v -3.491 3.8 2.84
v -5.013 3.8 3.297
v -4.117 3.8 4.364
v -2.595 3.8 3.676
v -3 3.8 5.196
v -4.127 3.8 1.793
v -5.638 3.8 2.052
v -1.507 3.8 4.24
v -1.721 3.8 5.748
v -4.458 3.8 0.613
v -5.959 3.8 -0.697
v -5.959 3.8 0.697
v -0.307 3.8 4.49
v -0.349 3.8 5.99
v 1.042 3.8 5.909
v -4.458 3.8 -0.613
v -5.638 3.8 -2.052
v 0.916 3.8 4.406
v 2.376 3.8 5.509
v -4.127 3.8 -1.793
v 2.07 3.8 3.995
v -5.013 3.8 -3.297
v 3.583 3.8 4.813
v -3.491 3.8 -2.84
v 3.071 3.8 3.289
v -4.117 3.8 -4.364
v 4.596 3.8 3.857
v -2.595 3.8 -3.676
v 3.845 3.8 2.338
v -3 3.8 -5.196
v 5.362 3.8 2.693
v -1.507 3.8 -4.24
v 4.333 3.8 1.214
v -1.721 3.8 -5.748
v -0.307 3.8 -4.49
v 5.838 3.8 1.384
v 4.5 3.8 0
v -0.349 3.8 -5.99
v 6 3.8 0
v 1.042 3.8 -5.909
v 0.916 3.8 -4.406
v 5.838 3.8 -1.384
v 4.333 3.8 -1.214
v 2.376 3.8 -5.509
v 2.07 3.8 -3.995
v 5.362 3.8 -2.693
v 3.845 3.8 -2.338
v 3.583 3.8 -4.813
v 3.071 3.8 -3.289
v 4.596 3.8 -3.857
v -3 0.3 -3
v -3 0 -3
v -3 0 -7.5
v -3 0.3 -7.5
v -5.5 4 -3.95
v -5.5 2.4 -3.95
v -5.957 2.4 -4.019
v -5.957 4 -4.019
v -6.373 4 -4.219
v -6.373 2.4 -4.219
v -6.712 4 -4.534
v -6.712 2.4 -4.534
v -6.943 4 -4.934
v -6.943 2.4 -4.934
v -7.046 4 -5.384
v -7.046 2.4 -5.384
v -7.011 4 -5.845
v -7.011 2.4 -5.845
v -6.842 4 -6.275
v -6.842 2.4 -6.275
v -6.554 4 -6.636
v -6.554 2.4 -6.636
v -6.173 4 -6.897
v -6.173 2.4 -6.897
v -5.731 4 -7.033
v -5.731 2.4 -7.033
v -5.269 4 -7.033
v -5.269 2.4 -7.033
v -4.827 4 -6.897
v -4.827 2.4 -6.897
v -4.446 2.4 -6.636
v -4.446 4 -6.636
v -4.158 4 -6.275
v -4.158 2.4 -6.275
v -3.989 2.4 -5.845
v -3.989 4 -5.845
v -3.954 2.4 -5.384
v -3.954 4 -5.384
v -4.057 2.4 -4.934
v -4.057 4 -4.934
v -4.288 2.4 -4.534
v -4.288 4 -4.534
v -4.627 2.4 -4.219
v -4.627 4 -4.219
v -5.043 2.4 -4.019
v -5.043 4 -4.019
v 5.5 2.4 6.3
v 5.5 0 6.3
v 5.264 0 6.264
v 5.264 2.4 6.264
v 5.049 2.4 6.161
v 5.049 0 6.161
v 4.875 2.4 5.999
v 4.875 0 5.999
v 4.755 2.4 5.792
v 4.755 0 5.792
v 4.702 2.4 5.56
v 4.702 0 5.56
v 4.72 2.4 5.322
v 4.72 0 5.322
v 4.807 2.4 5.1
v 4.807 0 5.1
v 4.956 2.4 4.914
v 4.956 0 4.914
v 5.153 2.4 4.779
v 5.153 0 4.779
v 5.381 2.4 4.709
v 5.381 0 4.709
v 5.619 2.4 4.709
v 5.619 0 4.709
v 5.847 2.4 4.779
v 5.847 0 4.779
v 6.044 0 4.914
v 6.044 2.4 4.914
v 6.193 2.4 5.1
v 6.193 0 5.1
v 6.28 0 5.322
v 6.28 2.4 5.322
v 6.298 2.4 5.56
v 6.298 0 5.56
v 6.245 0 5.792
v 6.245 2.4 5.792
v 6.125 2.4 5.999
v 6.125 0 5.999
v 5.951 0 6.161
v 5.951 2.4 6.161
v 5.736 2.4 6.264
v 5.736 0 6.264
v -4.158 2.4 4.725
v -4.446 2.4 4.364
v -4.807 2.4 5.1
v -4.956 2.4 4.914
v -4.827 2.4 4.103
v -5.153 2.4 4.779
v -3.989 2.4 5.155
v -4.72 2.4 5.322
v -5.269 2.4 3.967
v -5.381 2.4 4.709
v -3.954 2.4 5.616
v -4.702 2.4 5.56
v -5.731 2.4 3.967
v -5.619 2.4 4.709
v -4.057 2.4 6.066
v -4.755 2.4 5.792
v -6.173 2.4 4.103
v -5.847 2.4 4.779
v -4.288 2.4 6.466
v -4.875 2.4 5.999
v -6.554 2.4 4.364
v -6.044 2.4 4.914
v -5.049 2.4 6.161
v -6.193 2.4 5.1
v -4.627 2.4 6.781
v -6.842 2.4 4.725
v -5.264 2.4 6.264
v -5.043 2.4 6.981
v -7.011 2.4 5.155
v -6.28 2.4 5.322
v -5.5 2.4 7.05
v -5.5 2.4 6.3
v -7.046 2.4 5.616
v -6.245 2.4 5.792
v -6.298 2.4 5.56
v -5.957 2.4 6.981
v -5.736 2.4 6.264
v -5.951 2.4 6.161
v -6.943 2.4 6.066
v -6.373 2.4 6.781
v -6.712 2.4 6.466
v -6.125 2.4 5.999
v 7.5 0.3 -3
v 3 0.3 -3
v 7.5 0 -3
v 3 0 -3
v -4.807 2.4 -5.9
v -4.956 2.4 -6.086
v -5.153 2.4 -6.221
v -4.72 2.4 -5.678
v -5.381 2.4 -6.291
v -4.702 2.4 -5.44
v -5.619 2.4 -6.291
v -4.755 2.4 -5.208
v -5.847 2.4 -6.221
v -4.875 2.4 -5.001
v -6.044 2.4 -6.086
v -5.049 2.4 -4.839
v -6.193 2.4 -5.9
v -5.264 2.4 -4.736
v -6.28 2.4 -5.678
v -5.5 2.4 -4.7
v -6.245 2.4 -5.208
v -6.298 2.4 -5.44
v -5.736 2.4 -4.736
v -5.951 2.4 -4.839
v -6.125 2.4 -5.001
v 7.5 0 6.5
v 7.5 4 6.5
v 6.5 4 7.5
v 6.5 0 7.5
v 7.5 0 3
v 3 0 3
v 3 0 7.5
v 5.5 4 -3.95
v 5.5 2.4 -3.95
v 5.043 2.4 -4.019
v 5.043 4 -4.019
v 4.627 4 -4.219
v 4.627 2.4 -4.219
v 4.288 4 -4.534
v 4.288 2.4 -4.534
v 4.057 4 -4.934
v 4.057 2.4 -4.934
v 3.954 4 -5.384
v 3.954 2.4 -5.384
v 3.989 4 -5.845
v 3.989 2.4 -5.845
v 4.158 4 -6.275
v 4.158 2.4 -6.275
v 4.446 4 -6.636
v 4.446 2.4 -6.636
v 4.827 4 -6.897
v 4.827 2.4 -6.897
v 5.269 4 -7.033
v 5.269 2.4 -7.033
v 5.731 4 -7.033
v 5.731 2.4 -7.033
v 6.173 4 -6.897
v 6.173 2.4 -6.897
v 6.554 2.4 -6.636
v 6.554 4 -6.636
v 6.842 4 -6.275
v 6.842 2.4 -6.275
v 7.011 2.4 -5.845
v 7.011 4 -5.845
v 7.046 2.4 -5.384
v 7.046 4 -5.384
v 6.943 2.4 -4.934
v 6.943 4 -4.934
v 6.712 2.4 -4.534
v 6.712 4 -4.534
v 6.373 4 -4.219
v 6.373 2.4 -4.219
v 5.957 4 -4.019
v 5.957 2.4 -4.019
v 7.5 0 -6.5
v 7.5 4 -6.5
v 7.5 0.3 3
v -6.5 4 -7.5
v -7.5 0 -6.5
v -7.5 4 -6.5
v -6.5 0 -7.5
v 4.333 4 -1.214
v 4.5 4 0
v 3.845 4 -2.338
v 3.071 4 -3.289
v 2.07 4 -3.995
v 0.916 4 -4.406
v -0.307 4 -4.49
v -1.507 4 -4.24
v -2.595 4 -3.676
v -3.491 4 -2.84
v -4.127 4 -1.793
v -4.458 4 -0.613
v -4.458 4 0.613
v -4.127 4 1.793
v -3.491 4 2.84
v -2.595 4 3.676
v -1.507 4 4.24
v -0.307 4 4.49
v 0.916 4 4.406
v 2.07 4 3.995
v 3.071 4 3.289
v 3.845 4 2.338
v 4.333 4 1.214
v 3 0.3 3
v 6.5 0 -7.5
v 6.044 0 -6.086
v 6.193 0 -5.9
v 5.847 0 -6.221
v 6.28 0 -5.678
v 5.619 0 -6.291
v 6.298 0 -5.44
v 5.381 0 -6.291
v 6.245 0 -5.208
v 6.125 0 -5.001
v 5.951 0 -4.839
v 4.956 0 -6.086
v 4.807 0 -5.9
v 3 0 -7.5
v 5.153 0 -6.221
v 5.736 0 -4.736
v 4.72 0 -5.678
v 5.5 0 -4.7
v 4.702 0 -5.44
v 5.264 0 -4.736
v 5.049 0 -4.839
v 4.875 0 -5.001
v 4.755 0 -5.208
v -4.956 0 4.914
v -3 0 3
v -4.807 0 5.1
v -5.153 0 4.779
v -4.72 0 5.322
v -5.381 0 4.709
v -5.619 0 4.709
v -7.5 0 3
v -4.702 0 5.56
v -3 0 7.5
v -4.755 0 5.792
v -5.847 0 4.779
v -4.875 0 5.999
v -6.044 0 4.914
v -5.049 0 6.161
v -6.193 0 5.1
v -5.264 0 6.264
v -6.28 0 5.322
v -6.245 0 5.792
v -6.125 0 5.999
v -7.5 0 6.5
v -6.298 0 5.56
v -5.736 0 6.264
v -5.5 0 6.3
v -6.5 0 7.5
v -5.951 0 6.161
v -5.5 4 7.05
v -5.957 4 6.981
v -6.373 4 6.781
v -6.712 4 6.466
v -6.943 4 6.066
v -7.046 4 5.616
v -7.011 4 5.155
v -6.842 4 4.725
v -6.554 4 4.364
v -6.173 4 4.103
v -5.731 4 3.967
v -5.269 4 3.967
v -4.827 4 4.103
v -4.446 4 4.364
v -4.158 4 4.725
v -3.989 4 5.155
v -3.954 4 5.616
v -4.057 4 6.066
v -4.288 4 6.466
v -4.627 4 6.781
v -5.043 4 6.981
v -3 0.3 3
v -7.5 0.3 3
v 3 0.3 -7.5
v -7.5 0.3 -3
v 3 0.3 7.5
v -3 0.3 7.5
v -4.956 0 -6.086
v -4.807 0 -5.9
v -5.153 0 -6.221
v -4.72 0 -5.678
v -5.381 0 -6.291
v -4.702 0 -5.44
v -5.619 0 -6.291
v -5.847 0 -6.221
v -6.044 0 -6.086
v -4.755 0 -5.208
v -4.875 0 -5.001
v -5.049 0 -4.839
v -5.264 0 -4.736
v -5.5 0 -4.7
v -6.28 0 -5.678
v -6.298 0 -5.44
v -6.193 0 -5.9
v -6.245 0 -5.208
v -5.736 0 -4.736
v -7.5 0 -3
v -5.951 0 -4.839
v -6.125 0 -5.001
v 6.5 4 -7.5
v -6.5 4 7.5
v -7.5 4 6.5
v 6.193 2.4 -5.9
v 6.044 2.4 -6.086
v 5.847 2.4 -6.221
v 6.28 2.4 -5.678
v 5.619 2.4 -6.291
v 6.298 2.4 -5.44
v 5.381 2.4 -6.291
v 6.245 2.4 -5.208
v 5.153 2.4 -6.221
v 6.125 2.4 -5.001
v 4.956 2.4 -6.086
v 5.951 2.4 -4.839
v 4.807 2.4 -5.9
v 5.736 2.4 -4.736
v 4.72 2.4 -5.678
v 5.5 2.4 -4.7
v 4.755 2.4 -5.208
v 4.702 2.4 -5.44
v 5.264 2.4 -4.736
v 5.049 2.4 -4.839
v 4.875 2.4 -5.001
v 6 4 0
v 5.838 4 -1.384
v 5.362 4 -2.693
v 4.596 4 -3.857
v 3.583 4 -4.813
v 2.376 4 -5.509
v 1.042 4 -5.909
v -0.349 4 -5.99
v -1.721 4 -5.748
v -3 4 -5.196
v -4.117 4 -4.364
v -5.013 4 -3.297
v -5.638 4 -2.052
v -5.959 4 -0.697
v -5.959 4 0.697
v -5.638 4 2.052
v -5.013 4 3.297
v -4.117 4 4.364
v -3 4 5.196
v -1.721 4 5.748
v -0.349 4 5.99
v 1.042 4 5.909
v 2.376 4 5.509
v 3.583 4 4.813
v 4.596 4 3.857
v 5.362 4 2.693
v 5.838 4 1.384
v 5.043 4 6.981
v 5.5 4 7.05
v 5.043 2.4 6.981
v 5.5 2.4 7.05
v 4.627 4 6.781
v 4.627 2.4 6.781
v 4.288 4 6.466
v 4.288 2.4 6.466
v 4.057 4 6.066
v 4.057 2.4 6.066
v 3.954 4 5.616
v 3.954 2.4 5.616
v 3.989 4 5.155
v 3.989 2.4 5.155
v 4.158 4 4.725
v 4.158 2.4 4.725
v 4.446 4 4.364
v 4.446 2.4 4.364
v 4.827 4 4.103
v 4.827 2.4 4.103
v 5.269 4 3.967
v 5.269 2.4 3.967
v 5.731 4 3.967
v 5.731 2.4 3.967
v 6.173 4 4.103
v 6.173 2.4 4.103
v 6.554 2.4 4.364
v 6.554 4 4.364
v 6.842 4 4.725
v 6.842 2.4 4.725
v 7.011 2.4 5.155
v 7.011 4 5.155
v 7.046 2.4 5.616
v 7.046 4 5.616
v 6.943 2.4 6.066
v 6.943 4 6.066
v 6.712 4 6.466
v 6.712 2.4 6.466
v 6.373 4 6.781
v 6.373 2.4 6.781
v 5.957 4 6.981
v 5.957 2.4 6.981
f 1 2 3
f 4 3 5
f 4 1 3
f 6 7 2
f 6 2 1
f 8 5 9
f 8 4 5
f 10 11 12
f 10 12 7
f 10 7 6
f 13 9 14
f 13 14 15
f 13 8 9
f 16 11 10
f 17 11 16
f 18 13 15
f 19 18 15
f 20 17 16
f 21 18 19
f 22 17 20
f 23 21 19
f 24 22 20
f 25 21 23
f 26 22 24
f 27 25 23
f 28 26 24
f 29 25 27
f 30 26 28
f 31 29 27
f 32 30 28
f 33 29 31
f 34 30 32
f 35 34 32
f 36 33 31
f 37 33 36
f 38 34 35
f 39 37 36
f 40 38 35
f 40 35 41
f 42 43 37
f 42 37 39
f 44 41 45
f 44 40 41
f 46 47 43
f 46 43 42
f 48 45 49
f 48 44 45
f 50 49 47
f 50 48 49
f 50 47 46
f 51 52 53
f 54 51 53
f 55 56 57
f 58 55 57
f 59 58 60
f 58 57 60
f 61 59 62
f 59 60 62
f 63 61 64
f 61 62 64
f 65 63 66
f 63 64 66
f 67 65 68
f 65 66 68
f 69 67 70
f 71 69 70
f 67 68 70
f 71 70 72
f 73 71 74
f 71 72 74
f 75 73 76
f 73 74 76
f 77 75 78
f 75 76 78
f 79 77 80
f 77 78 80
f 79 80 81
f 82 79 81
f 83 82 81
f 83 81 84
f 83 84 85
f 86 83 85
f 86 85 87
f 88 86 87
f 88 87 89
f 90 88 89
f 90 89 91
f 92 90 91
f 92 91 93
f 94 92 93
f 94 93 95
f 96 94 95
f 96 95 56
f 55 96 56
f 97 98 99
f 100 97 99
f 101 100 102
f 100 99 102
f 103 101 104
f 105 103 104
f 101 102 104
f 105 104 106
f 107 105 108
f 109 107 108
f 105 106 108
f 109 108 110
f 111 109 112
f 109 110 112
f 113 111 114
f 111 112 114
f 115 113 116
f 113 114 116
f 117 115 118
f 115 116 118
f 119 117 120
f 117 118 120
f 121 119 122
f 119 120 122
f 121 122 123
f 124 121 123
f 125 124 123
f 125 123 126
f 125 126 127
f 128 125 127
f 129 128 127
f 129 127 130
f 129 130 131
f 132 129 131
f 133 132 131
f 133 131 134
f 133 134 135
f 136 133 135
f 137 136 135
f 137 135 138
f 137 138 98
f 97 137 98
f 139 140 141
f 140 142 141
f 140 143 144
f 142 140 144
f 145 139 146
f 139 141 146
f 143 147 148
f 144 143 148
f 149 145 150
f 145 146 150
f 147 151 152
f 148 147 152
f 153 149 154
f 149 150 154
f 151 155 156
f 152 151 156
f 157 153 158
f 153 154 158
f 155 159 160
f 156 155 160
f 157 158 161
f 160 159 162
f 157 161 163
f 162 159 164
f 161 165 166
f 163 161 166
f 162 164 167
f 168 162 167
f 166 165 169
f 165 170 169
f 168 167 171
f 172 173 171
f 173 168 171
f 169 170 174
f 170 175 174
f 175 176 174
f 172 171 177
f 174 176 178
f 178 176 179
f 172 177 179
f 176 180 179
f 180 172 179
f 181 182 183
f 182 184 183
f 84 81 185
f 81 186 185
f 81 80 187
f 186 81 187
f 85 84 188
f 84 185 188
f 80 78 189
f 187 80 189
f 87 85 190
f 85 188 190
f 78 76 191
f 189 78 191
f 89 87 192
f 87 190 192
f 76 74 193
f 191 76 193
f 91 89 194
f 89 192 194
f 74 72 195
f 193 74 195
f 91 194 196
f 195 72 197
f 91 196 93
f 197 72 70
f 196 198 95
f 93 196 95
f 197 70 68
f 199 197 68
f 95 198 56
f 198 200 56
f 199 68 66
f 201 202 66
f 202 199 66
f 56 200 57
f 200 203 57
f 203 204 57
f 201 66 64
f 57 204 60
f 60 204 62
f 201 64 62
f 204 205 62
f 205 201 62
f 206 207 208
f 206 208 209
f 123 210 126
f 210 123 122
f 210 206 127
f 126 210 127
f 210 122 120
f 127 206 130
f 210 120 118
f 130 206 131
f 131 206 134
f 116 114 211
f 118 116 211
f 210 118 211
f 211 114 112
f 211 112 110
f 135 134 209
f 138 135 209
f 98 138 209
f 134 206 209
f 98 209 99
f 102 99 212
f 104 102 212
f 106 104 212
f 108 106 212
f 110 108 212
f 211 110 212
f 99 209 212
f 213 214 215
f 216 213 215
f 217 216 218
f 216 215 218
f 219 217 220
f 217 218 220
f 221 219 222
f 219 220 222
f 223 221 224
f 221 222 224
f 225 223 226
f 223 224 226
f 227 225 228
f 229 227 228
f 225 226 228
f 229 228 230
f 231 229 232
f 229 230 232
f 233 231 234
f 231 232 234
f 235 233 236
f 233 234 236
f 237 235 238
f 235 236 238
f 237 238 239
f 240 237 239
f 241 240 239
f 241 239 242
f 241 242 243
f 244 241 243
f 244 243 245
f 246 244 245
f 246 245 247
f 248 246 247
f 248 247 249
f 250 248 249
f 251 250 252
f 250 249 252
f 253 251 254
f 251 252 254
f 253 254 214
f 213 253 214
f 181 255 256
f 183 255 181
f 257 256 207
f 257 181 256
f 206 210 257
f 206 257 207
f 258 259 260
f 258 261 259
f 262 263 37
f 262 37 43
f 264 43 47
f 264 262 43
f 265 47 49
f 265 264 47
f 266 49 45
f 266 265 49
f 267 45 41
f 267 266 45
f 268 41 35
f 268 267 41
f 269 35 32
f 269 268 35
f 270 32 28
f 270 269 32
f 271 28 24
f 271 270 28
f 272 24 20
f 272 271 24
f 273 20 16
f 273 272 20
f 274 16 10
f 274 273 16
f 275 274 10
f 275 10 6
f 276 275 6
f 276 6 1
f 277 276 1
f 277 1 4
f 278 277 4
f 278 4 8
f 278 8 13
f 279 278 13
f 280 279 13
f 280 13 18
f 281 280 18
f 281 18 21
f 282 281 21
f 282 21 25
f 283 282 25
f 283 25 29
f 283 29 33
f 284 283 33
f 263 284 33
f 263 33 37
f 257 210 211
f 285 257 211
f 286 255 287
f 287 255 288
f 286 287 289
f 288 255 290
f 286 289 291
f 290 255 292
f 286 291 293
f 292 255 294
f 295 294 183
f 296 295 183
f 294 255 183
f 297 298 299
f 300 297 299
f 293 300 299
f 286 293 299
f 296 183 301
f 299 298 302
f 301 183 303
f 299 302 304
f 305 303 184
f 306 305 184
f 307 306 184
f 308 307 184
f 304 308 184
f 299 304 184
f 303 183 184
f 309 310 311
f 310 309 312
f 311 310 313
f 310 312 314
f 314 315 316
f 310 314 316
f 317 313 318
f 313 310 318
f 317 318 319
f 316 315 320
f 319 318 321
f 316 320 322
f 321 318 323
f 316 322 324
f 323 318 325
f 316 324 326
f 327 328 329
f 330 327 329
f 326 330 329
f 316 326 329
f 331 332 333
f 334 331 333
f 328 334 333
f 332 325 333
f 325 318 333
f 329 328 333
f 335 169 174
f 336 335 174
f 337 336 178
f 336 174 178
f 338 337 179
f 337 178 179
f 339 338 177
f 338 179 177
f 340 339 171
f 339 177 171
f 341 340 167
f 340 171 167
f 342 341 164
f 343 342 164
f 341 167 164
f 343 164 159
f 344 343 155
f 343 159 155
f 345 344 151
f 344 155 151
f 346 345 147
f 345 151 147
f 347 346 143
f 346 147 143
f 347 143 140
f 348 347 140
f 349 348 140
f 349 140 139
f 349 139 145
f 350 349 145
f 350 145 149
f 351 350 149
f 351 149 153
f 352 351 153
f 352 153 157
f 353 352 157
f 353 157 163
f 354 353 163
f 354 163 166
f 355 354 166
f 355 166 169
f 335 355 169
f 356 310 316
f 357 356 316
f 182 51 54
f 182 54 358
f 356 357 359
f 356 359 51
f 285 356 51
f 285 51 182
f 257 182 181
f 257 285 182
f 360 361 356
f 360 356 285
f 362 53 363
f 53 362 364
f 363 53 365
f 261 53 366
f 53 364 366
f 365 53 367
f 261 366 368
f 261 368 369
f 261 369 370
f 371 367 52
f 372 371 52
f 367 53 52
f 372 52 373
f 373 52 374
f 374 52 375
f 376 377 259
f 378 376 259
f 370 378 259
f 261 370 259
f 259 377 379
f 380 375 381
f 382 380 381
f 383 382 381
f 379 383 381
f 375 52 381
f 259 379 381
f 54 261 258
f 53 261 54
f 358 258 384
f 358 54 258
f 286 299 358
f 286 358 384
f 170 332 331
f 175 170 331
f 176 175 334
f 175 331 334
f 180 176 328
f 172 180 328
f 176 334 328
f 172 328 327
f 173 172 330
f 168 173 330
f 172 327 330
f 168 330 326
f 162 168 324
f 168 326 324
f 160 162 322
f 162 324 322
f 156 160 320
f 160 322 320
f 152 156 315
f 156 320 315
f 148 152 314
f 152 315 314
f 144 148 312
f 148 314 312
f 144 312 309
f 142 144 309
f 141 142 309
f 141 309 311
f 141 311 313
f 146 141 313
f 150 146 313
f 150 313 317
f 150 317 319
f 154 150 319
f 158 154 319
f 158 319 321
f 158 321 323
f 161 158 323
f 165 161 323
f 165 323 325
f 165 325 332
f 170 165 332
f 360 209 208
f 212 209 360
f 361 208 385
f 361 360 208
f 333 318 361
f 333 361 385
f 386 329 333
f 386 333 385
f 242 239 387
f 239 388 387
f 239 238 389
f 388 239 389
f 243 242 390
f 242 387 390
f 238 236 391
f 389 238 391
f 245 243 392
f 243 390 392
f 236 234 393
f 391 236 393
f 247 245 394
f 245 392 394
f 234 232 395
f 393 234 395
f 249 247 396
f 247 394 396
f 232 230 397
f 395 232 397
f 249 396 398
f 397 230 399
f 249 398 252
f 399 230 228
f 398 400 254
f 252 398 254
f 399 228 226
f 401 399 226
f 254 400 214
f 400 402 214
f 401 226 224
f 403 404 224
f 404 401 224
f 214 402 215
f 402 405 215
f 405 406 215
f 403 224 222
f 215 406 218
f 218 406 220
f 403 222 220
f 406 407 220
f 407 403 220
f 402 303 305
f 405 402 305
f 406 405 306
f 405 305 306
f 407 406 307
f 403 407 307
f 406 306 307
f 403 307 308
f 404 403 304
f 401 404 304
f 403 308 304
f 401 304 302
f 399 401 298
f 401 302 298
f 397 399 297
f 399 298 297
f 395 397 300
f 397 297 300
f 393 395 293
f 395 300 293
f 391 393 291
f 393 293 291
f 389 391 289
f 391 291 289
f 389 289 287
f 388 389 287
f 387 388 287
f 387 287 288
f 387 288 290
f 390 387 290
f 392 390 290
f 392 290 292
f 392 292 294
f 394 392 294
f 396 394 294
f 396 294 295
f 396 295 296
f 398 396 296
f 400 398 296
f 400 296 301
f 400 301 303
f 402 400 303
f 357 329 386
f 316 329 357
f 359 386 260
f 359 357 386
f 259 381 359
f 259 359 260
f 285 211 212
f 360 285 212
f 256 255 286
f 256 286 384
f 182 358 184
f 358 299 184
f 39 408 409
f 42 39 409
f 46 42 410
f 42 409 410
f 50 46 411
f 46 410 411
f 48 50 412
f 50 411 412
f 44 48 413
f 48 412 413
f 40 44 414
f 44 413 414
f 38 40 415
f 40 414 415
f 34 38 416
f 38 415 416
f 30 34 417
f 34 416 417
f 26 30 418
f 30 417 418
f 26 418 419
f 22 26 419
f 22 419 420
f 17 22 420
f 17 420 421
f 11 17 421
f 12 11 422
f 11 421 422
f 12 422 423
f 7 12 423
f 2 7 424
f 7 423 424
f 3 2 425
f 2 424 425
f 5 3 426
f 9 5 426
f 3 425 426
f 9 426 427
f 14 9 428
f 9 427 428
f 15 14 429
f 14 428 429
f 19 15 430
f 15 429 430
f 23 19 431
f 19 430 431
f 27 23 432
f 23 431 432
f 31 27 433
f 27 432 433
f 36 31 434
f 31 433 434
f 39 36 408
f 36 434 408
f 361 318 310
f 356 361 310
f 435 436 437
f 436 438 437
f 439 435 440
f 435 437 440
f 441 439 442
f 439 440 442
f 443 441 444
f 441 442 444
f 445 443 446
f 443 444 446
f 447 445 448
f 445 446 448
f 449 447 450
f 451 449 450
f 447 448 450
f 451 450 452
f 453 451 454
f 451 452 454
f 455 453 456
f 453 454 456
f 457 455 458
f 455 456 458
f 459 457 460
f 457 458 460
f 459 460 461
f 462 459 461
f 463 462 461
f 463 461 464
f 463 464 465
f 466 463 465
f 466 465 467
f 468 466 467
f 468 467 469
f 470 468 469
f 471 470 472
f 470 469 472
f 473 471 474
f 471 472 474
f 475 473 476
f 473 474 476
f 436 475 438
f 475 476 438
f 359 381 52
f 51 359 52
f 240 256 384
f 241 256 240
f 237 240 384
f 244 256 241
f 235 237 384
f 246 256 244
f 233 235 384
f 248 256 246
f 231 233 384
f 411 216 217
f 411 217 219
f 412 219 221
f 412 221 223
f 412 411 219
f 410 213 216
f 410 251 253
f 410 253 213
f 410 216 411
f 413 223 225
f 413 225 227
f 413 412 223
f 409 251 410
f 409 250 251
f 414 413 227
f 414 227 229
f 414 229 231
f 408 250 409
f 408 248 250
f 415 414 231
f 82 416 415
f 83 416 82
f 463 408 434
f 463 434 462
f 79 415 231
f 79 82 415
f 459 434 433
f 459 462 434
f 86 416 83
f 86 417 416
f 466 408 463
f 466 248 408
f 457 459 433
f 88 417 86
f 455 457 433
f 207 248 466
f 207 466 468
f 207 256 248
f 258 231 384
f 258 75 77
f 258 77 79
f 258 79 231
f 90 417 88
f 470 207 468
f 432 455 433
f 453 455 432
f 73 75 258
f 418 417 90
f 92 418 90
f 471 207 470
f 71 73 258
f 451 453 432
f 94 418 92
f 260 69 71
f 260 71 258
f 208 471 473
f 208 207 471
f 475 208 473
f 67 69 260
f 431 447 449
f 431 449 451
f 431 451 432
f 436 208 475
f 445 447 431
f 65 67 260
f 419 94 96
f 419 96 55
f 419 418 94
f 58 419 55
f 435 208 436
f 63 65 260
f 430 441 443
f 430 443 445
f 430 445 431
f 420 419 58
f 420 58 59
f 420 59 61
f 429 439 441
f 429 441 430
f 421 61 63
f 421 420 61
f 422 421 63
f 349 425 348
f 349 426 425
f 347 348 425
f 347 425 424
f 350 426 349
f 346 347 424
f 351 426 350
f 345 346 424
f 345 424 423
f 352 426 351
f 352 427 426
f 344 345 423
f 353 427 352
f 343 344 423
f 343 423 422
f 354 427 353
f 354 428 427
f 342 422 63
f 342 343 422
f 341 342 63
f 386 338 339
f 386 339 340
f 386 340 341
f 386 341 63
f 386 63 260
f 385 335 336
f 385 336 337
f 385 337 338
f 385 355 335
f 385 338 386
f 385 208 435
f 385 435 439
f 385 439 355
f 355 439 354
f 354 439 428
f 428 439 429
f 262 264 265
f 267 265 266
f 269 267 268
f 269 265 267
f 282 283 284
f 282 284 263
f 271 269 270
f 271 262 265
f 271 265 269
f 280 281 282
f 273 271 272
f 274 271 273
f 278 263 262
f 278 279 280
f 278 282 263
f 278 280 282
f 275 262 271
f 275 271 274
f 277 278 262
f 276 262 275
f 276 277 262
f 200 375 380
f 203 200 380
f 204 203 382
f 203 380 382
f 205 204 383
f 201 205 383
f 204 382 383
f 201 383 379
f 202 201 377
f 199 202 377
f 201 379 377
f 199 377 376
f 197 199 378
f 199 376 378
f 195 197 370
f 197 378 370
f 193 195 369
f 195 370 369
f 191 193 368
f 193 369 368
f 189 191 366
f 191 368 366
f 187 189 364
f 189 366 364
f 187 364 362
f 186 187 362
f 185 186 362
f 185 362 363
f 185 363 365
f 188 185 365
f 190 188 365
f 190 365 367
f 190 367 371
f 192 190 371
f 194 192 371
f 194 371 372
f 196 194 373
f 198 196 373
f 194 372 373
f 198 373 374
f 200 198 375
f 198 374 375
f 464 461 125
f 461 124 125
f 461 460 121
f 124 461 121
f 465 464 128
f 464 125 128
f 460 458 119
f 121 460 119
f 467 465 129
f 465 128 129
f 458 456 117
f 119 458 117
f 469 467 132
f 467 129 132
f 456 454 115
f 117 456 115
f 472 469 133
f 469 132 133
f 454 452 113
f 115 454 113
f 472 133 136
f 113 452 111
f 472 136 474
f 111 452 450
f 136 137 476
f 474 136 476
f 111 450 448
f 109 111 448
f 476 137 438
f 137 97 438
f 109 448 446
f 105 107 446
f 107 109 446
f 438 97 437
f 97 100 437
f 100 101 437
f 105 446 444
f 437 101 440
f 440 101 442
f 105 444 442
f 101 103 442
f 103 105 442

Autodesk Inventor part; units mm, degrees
ref_plane "YZ Plane" through (0, 0, 0) normal (1, 0, 0) x (0, 1, 0)
ref_plane "XZ Plane" through (0, 0, 0) normal (0, 1, 0) x (-1, 0, 0)
ref_plane "XY Plane" through (0, 0, 0) normal (0, 0, 1) x (1, 0, 0)
sketch "Sketch1" plane through (0, 0, 0) normal (0, 1, 0) x (-1, 0, 0)
  line L0 (-7.5, 7.5) -> (7.5, 7.5)
  line L1 (7.5, 7.5) -> (7.5, -7.5)
  line L2 (7.5, -7.5) -> (-7.5, -7.5)
  line L3 (-7.5, -7.5) -> (-7.5, 7.5)
  line L4 (-7.5, 7.5) -> (7.5, -7.5) construction
  line L5 (7.5, 7.5) -> (-7.5, -7.5) construction
  point P0 (0, 0)
  dimension "d0" = 15
  dimension "d1" = 15
extrude "Extrusion1" add sketch "Sketch1" along normal blind 4
sketch "Sketch2" plane through (0, 4, 0) normal (0, 1, 0) x (1, 0, 0)
  line L0 (5.5, -5.5) -> (-5.5, -5.5) construction
  line L1 (-5.5, -5.5) -> (-5.5, 5.5) construction
  line L2 (-5.5, 5.5) -> (5.5, 5.5) construction
  line L3 (5.5, 5.5) -> (5.5, -5.5) construction
  line L4 (5.5, -5.5) -> (-5.5, 5.5) construction
  line L5 (-5.5, -5.5) -> (5.5, 5.5) construction
  point P0 (0, 0)
  dimension "d4" = 11
  dimension "d5" = 11
chamfer "Chamfer1" distance 1 angle 45 4 edges at (-7.5, 2, 7.5) (7.5, 2, 7.5) (7.5, 2, -7.5) (-7.5, 2, -7.5)
hole "Hole1" at (-5.5, 4, -5.5) at (5.5, 4, -5.5) at (5.5, 4, 5.5) at (-5.5, 4, 5.5) direction (0, -1, 0) diameter 1.6 end through all counterbore diameter 3.1 counterbore depth 1.6 clearance for "Socket Head Cap Screw ISO 4762" size "M1.4" standard "ISO"
sketch "Sketch3" plane through (0, 4, 0) normal (0, 1, 0) x (1, 0, 0)
  circle A0 centre (0, 0) radius 6
  circle A1 centre (0, 0) radius 4.5
  dimension "d16" = 12
  dimension "d17" = 9
extrude "Extrusion2" cut sketch "Sketch3" against normal blind 0.2
sketch "Sketch4" plane through (0, 0, 0) normal (0, -1, 0) x (1, 0, 0)
  line L0 (-6.5, 7.5) -> (6.5, 7.5) projected
  line L1 (-3, -7.5) -> (3, -7.5)
  line L2 (3, -7.5) -> (3, 7.5)
  line L3 (3, 7.5) -> (-3, 7.5)
  line L4 (-3, 7.5) -> (-3, -7.5)
  line L5 (-3, -7.5) -> (3, 7.5) construction
  line L6 (3, -7.5) -> (-3, 7.5) construction
  line L7 (7.5, 6.5) -> (7.5, -6.5) projected
  line L8 (-7.5, -3) -> (7.5, -3)
  line L9 (7.5, -3) -> (7.5, 3)
  line L10 (7.5, 3) -> (-7.5, 3)
  line L11 (-7.5, 3) -> (-7.5, -3)
  line L12 (-7.5, -3) -> (7.5, 3) construction
  line L13 (7.5, -3) -> (-7.5, 3) construction
  point P0 (0, 0)
  point P1 (-3, -3)
  point P2 (3, -3)
  point P3 (3, 3)
  point P4 (-3, 3)
  dimension "d20" = 6
  dimension "d21" = 6
extrude "Extrusion3" cut sketch "Sketch4" against normal blind 0.3
properties part number "D-100.00 Capacitive Sensor" material "Aluminum 6061"
